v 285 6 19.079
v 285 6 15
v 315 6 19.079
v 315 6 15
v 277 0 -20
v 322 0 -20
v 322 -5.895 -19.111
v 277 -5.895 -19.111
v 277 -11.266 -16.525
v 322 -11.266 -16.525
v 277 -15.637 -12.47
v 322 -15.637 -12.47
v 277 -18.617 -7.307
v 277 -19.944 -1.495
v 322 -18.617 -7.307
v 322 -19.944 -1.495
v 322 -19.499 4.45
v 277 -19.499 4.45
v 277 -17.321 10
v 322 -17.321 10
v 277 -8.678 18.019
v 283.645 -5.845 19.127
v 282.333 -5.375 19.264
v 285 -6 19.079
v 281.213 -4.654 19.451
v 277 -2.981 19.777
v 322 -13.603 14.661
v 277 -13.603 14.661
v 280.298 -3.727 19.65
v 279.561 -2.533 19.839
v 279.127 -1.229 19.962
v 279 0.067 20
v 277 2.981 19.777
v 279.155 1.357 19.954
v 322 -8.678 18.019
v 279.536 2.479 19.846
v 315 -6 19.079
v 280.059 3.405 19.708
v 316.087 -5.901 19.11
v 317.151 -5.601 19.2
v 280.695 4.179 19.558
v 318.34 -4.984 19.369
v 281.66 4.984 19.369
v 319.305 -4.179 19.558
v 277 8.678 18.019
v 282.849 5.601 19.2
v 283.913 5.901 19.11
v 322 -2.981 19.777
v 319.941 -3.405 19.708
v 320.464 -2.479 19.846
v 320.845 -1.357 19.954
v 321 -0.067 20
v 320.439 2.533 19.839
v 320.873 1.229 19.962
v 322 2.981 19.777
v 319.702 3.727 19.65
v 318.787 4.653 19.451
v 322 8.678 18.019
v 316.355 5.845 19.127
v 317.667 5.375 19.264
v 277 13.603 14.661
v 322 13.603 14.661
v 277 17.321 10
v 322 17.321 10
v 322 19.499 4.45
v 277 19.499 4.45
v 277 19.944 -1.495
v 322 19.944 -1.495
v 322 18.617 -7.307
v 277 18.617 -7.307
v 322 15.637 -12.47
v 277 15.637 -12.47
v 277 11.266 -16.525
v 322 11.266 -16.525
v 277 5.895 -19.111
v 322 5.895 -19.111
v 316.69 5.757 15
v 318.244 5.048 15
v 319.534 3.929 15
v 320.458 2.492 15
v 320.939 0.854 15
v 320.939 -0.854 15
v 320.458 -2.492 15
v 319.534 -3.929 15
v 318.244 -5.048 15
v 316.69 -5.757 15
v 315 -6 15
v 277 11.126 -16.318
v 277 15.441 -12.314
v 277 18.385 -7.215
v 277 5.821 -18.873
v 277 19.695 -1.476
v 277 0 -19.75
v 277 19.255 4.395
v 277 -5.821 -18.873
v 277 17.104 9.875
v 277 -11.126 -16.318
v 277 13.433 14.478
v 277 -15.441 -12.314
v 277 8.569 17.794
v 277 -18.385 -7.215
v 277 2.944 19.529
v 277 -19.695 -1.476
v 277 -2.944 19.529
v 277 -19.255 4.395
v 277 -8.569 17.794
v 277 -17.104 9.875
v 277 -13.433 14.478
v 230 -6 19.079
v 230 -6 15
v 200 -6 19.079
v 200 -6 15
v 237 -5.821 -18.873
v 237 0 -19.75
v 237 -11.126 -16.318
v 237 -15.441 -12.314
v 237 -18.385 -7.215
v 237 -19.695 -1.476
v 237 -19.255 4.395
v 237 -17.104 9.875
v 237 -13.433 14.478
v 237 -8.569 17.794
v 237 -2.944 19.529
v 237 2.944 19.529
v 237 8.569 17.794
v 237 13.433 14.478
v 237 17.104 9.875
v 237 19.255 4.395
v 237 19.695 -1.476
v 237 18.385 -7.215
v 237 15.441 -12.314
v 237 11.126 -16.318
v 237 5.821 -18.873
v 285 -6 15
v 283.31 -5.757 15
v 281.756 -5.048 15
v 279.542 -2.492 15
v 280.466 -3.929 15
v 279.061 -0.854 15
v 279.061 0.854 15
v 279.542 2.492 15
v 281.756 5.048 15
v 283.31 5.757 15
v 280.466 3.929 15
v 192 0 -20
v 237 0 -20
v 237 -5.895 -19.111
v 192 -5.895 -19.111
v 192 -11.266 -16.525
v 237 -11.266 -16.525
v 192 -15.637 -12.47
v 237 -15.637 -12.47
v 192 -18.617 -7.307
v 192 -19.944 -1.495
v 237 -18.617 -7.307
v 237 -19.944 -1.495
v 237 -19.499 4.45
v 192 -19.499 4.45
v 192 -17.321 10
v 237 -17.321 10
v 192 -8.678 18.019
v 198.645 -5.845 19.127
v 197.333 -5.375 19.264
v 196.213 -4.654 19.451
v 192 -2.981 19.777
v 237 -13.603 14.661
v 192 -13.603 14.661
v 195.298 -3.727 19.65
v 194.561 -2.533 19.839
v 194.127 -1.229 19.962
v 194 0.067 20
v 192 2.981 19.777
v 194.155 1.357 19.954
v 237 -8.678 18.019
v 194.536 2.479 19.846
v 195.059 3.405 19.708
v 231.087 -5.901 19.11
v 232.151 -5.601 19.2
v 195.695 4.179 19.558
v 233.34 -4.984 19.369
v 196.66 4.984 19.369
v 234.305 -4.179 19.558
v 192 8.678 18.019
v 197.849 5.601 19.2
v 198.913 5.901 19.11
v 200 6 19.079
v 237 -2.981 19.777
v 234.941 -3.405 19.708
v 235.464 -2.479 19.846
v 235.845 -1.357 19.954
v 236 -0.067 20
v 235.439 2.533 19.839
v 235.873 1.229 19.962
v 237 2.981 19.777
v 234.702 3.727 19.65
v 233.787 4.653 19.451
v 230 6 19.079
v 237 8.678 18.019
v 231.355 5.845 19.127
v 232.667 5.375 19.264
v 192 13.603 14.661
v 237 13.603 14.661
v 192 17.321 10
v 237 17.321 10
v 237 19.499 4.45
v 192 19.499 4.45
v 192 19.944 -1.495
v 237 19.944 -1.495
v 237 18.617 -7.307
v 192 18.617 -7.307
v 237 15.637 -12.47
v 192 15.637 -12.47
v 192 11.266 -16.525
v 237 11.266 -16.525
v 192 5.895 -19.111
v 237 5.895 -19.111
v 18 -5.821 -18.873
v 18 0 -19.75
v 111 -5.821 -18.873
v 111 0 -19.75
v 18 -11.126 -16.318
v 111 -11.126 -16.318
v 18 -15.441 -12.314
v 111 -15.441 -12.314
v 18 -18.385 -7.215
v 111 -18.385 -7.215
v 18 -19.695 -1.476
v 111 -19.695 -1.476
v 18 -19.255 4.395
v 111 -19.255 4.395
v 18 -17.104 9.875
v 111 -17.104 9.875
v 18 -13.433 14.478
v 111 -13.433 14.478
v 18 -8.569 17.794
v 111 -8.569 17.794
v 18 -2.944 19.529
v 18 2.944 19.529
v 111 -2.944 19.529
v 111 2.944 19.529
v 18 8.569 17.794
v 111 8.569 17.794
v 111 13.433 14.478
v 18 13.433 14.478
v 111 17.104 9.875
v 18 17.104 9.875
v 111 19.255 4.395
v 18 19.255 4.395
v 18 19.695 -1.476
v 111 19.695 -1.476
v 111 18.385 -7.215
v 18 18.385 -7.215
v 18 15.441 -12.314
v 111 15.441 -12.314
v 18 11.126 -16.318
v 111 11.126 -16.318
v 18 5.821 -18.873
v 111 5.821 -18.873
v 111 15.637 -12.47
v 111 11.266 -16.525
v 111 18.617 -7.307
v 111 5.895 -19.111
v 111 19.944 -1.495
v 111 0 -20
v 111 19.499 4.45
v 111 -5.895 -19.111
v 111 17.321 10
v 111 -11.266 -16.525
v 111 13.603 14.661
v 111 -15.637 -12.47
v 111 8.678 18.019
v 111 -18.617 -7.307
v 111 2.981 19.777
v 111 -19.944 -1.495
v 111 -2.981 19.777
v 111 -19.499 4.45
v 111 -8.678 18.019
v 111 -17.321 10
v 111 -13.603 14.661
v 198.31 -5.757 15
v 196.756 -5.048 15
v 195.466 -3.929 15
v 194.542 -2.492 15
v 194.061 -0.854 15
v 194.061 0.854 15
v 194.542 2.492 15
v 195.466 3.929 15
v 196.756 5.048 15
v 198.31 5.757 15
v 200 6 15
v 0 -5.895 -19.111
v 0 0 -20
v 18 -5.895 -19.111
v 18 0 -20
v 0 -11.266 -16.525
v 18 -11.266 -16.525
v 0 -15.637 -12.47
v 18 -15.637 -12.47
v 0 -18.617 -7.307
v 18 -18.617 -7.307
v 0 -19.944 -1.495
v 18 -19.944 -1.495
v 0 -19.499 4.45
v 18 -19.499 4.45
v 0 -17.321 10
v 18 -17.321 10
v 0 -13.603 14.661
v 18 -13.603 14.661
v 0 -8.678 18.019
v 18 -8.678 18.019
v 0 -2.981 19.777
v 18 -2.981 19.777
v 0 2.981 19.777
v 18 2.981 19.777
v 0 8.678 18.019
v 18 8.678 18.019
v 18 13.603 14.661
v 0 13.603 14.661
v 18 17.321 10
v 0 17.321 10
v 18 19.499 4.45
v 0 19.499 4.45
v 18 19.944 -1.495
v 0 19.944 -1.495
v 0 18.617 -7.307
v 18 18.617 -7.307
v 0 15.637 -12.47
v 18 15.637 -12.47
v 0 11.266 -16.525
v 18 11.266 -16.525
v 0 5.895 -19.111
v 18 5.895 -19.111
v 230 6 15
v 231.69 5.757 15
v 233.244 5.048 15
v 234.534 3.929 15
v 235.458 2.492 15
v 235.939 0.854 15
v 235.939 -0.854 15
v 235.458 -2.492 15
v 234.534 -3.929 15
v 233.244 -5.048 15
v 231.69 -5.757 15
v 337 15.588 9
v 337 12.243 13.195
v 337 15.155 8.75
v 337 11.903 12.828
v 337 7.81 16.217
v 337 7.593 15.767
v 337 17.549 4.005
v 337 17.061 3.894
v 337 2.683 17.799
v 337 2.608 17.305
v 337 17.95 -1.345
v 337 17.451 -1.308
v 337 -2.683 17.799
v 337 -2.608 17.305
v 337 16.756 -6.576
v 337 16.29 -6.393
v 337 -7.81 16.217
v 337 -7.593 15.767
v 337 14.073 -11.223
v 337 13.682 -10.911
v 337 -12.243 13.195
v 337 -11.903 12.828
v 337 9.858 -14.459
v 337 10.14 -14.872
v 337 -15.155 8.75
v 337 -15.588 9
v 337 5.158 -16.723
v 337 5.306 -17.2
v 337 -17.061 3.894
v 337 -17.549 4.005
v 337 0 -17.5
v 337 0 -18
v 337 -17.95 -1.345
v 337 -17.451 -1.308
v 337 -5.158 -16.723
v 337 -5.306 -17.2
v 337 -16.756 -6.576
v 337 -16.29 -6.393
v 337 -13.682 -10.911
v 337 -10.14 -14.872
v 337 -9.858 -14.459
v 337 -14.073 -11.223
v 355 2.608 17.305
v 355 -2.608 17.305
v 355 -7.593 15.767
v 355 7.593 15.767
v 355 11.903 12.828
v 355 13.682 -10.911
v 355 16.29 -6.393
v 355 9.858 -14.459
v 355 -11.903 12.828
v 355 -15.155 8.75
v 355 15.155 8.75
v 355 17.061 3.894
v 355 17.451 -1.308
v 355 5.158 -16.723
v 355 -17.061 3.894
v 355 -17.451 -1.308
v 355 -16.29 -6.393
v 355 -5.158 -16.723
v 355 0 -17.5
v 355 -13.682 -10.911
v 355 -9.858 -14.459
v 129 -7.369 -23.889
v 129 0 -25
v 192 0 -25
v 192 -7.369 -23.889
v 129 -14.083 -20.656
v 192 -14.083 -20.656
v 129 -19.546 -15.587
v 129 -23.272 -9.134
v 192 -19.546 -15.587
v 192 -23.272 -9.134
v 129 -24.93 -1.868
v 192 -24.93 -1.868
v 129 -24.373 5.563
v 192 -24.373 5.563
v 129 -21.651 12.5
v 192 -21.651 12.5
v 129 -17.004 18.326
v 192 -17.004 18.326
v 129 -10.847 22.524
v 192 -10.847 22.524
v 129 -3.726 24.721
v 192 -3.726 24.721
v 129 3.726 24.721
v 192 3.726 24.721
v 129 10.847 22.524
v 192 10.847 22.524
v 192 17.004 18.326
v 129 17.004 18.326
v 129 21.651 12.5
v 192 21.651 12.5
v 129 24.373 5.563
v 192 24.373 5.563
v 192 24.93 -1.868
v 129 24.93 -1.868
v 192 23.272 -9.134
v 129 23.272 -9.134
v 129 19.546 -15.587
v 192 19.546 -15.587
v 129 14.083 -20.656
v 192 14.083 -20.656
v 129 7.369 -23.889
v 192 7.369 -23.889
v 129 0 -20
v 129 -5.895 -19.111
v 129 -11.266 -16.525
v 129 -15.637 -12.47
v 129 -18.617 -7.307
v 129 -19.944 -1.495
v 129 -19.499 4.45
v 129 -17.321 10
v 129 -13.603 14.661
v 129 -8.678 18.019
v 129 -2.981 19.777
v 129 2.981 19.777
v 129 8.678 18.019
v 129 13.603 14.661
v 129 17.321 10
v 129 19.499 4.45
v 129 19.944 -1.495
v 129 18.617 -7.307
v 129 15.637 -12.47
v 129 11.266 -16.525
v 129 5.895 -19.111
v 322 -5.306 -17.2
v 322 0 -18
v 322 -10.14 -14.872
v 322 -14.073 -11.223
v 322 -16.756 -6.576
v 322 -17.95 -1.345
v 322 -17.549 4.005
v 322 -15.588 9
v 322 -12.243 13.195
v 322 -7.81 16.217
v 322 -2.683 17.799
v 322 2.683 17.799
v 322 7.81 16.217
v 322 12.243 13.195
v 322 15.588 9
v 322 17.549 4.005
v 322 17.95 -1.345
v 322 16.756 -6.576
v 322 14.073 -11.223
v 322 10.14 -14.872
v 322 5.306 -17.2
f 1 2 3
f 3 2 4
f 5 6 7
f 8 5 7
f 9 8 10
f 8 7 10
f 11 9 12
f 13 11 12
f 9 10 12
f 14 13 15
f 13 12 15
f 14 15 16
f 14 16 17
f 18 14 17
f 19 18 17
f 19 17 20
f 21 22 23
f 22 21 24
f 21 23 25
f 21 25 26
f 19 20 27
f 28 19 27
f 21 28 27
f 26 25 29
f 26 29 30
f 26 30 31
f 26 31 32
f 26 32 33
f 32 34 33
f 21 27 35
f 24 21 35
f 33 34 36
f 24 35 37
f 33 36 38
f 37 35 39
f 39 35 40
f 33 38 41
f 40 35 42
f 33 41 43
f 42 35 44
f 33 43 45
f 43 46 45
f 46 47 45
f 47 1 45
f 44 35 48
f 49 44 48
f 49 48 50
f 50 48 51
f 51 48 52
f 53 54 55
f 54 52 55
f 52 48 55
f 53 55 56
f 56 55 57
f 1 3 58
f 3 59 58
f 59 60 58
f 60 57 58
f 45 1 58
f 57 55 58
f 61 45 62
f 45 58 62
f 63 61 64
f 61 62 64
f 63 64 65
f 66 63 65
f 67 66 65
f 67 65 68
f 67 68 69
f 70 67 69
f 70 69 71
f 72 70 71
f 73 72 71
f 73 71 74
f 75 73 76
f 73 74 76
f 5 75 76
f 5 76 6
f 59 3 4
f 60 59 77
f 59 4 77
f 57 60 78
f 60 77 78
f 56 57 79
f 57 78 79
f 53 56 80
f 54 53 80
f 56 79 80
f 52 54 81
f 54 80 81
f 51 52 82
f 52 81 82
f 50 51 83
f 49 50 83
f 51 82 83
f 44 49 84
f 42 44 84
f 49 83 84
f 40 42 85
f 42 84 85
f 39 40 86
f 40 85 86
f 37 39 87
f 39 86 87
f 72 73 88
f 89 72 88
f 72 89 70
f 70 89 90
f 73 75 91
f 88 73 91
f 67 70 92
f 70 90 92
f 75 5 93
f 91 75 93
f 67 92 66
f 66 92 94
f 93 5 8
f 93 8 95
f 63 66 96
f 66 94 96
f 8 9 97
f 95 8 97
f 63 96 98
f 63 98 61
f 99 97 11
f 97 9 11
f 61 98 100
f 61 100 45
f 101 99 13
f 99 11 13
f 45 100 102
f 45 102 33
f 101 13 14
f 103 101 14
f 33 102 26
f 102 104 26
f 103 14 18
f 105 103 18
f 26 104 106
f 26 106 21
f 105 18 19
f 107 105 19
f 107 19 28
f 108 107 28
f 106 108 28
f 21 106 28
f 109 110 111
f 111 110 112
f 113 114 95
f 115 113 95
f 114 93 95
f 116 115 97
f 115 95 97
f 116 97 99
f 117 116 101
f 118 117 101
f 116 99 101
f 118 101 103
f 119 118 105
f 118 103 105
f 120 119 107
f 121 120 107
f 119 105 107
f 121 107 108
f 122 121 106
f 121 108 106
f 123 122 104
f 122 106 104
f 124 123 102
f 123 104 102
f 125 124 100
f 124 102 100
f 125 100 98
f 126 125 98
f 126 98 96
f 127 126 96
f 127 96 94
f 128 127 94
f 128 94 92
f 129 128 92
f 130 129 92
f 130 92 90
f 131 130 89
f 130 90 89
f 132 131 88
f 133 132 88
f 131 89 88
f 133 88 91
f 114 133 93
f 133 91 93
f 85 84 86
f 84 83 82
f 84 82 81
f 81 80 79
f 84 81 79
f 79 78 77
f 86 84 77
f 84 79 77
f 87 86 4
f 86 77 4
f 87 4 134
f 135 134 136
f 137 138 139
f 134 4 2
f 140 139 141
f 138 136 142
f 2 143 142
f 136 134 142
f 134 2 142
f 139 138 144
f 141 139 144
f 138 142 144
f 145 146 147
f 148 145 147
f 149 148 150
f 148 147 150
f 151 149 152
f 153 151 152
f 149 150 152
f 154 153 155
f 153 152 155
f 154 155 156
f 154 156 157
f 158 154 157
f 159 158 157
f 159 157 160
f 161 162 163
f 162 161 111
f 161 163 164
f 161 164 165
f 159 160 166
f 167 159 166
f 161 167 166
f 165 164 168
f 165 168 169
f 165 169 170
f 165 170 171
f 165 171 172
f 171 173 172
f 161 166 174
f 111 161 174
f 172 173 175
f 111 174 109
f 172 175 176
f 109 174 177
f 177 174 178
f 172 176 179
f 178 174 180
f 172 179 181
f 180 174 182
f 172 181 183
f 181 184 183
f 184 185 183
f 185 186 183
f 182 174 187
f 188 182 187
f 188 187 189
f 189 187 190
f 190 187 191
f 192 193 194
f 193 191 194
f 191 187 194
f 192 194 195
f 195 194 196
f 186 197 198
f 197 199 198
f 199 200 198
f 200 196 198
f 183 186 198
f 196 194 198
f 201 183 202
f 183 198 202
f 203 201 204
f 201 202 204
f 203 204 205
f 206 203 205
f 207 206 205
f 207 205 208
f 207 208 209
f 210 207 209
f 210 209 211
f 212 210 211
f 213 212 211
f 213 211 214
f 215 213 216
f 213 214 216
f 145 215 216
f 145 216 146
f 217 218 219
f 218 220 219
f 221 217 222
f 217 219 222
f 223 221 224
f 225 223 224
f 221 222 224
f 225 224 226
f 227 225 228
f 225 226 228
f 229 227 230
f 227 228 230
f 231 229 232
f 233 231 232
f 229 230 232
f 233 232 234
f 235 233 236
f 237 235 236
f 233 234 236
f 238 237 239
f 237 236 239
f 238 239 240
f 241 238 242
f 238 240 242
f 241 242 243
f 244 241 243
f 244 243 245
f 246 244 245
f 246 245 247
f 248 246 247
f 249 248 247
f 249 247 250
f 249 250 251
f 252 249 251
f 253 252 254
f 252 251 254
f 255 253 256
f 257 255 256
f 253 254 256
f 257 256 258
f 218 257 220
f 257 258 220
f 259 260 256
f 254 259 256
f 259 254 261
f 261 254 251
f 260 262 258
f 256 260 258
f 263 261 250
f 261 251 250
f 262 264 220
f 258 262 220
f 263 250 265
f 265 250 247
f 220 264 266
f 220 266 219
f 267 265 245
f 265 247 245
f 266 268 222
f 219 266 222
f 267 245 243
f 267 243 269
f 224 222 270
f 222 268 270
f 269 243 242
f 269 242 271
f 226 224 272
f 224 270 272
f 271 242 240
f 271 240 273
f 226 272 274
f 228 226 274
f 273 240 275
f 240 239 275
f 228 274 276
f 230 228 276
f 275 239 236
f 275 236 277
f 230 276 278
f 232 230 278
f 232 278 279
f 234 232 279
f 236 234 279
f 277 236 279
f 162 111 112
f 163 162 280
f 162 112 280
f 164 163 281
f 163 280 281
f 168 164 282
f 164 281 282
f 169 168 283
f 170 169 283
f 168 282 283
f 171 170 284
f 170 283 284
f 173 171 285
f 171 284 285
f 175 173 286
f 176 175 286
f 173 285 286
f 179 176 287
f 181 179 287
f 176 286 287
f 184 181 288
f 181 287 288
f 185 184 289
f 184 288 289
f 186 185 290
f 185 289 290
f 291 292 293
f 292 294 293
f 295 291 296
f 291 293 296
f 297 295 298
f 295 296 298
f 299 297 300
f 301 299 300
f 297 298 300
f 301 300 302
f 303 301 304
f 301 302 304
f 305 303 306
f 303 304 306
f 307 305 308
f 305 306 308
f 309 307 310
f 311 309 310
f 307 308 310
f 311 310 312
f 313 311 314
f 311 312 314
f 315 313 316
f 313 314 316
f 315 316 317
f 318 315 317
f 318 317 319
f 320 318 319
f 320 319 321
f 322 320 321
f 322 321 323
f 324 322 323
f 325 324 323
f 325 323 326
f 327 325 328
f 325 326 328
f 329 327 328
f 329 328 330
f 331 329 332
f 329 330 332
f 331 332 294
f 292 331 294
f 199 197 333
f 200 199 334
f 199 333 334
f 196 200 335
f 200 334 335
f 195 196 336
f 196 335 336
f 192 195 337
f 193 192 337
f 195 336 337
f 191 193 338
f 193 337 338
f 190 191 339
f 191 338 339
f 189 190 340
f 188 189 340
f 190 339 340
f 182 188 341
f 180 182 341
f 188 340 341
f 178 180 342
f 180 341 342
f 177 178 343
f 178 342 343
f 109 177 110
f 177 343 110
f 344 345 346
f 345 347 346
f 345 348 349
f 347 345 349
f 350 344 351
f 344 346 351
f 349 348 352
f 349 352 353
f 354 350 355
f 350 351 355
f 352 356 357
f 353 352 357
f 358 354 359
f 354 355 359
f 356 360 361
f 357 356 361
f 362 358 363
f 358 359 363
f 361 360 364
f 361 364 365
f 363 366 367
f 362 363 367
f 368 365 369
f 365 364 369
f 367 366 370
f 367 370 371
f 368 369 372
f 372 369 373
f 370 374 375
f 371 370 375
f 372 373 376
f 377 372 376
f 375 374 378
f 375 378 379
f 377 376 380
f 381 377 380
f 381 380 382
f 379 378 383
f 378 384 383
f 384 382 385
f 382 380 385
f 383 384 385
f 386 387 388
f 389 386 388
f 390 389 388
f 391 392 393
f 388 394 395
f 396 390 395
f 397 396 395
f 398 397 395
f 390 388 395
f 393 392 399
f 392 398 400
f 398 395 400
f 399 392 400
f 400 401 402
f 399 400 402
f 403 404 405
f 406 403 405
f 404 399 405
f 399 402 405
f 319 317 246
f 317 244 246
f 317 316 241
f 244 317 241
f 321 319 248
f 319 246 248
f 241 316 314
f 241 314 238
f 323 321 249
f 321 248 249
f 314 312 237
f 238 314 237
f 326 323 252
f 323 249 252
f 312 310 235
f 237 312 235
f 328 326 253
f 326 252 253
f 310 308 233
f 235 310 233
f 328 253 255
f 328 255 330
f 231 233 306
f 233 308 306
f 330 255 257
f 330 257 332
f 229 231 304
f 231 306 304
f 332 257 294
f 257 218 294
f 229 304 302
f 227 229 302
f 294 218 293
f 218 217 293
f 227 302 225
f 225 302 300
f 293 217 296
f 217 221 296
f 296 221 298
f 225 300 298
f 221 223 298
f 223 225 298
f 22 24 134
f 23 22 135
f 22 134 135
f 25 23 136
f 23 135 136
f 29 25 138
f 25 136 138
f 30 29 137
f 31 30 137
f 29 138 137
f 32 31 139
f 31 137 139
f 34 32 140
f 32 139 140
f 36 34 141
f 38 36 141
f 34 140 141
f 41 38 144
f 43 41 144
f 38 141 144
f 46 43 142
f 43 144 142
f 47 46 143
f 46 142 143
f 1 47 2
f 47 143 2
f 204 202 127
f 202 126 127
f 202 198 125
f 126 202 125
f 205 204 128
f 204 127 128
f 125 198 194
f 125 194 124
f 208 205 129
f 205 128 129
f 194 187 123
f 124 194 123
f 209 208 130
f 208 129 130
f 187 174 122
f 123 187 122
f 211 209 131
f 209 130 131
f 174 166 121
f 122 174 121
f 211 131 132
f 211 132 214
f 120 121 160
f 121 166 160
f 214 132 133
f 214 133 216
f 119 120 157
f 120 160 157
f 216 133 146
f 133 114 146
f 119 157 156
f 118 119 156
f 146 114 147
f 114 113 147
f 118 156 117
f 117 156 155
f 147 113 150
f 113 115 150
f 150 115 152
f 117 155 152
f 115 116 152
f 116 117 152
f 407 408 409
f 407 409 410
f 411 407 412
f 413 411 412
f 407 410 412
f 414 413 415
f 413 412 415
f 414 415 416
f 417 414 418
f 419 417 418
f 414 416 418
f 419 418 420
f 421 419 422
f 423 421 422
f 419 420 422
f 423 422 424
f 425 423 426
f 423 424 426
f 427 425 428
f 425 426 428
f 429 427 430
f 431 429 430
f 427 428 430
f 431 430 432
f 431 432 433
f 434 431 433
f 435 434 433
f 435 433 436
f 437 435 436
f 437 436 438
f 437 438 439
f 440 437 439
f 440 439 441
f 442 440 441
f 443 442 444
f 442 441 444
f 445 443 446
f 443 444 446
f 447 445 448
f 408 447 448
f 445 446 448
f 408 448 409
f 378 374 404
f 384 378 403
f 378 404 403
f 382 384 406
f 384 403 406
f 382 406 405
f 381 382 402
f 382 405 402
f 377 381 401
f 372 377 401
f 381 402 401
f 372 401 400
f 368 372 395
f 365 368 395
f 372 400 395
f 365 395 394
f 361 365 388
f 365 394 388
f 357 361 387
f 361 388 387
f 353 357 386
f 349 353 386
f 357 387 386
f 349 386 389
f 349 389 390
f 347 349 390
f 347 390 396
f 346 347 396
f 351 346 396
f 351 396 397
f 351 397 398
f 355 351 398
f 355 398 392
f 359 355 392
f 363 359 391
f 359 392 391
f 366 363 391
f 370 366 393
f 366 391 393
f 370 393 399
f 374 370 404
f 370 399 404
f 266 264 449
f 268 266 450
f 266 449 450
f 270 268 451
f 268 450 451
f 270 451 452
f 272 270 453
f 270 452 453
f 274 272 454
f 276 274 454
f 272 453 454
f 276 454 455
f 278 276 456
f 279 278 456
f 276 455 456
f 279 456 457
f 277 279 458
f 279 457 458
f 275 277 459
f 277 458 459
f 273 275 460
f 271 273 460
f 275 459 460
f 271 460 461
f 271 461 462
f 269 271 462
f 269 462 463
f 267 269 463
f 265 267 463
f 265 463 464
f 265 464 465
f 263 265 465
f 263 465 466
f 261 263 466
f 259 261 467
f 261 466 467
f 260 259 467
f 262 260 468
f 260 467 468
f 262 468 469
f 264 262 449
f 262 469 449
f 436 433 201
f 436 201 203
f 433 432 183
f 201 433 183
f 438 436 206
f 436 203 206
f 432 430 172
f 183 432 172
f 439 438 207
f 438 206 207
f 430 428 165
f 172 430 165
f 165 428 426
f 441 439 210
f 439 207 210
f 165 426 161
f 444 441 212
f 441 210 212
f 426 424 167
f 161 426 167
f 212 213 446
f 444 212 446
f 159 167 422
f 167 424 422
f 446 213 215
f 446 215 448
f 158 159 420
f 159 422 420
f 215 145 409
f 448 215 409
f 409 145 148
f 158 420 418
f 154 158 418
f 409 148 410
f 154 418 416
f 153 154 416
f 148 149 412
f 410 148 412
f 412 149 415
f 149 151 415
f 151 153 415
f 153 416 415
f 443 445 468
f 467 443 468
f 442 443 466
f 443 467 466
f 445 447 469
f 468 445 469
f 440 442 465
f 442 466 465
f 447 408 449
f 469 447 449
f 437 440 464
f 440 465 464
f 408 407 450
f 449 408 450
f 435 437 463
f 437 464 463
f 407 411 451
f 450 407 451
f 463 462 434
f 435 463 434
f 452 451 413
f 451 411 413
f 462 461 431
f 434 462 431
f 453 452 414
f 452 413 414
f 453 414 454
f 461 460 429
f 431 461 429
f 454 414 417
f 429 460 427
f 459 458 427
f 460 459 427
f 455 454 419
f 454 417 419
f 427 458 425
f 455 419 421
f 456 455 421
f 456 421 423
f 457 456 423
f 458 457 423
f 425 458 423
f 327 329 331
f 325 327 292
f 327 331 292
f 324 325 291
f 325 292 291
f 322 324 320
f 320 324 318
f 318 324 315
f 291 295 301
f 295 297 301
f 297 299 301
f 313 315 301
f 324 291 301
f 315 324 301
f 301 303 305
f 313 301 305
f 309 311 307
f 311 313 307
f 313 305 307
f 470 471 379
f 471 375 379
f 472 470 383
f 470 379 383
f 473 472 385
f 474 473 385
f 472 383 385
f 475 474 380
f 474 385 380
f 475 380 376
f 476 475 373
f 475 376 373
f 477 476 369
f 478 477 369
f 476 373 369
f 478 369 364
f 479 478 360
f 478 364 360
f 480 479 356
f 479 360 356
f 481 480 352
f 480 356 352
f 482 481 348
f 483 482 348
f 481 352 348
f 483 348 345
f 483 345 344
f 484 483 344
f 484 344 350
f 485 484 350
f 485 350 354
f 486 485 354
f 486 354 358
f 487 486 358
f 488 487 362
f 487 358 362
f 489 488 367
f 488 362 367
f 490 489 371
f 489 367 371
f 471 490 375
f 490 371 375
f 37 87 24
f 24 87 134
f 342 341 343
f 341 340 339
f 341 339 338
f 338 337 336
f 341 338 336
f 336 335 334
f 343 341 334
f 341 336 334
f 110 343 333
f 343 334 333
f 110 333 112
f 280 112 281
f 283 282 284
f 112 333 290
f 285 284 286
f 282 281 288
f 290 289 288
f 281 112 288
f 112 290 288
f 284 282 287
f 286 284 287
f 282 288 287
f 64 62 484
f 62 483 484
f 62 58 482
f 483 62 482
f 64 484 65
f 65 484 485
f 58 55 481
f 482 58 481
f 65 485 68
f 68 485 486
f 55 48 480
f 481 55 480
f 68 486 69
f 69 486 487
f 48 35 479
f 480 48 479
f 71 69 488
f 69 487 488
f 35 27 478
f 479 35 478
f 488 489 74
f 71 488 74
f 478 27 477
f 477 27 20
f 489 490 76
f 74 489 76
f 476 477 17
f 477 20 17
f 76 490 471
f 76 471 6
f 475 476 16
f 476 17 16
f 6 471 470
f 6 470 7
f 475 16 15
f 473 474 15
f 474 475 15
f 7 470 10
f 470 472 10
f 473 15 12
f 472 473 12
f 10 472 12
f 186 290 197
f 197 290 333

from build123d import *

# Parameters (mm, degrees)
CUT_EXTRUDE_1_DEPTH = 10


with BuildPart() as part:
    # 草图1 → 旋转1 (revolve)
    with BuildSketch(Plane.XY, mode=Mode.PRIVATE) as revolve_1_sk:
        Polygon((0, 0), (0, 20), (18, 20), (18, 19.75), (111, 19.75), (111, 20), (129, 20), (129, 25), (192, 25), (192, 20), (237, 20), (237, 19.75), (277, 19.75), (277, 20), (322, 20), (322, 18), (337, 18), (337, 17.5), (355, 17.5), (355, 0), align=None)
    revolve(revolve_1_sk.sketch.rotate(Axis((0, 0, 0), (-1, 0, 0)), 90), axis=Axis((0, 0, 0), (-1, 0, 0)))

    # 草图2 → 切除-拉伸1 (cut)
    with BuildSketch(Plane.XY.offset(15)):
        with BuildLine():
            Line((200, 6), (230, 6))
            ThreePointArc((230, 6), (236, 0), (230, -6))
            Line((230, -6), (200, -6))
            ThreePointArc((200, -6), (194, 0), (200, 6))
        make_face()
        with BuildLine():
            Line((285, 6), (315, 6))
            ThreePointArc((315, 6), (321, 0), (315, -6))
            Line((315, -6), (285, -6))
            ThreePointArc((285, -6), (279, 0), (285, 6))
        make_face()
    extrude(amount=CUT_EXTRUDE_1_DEPTH, mode=Mode.SUBTRACT)


solid = part.part
